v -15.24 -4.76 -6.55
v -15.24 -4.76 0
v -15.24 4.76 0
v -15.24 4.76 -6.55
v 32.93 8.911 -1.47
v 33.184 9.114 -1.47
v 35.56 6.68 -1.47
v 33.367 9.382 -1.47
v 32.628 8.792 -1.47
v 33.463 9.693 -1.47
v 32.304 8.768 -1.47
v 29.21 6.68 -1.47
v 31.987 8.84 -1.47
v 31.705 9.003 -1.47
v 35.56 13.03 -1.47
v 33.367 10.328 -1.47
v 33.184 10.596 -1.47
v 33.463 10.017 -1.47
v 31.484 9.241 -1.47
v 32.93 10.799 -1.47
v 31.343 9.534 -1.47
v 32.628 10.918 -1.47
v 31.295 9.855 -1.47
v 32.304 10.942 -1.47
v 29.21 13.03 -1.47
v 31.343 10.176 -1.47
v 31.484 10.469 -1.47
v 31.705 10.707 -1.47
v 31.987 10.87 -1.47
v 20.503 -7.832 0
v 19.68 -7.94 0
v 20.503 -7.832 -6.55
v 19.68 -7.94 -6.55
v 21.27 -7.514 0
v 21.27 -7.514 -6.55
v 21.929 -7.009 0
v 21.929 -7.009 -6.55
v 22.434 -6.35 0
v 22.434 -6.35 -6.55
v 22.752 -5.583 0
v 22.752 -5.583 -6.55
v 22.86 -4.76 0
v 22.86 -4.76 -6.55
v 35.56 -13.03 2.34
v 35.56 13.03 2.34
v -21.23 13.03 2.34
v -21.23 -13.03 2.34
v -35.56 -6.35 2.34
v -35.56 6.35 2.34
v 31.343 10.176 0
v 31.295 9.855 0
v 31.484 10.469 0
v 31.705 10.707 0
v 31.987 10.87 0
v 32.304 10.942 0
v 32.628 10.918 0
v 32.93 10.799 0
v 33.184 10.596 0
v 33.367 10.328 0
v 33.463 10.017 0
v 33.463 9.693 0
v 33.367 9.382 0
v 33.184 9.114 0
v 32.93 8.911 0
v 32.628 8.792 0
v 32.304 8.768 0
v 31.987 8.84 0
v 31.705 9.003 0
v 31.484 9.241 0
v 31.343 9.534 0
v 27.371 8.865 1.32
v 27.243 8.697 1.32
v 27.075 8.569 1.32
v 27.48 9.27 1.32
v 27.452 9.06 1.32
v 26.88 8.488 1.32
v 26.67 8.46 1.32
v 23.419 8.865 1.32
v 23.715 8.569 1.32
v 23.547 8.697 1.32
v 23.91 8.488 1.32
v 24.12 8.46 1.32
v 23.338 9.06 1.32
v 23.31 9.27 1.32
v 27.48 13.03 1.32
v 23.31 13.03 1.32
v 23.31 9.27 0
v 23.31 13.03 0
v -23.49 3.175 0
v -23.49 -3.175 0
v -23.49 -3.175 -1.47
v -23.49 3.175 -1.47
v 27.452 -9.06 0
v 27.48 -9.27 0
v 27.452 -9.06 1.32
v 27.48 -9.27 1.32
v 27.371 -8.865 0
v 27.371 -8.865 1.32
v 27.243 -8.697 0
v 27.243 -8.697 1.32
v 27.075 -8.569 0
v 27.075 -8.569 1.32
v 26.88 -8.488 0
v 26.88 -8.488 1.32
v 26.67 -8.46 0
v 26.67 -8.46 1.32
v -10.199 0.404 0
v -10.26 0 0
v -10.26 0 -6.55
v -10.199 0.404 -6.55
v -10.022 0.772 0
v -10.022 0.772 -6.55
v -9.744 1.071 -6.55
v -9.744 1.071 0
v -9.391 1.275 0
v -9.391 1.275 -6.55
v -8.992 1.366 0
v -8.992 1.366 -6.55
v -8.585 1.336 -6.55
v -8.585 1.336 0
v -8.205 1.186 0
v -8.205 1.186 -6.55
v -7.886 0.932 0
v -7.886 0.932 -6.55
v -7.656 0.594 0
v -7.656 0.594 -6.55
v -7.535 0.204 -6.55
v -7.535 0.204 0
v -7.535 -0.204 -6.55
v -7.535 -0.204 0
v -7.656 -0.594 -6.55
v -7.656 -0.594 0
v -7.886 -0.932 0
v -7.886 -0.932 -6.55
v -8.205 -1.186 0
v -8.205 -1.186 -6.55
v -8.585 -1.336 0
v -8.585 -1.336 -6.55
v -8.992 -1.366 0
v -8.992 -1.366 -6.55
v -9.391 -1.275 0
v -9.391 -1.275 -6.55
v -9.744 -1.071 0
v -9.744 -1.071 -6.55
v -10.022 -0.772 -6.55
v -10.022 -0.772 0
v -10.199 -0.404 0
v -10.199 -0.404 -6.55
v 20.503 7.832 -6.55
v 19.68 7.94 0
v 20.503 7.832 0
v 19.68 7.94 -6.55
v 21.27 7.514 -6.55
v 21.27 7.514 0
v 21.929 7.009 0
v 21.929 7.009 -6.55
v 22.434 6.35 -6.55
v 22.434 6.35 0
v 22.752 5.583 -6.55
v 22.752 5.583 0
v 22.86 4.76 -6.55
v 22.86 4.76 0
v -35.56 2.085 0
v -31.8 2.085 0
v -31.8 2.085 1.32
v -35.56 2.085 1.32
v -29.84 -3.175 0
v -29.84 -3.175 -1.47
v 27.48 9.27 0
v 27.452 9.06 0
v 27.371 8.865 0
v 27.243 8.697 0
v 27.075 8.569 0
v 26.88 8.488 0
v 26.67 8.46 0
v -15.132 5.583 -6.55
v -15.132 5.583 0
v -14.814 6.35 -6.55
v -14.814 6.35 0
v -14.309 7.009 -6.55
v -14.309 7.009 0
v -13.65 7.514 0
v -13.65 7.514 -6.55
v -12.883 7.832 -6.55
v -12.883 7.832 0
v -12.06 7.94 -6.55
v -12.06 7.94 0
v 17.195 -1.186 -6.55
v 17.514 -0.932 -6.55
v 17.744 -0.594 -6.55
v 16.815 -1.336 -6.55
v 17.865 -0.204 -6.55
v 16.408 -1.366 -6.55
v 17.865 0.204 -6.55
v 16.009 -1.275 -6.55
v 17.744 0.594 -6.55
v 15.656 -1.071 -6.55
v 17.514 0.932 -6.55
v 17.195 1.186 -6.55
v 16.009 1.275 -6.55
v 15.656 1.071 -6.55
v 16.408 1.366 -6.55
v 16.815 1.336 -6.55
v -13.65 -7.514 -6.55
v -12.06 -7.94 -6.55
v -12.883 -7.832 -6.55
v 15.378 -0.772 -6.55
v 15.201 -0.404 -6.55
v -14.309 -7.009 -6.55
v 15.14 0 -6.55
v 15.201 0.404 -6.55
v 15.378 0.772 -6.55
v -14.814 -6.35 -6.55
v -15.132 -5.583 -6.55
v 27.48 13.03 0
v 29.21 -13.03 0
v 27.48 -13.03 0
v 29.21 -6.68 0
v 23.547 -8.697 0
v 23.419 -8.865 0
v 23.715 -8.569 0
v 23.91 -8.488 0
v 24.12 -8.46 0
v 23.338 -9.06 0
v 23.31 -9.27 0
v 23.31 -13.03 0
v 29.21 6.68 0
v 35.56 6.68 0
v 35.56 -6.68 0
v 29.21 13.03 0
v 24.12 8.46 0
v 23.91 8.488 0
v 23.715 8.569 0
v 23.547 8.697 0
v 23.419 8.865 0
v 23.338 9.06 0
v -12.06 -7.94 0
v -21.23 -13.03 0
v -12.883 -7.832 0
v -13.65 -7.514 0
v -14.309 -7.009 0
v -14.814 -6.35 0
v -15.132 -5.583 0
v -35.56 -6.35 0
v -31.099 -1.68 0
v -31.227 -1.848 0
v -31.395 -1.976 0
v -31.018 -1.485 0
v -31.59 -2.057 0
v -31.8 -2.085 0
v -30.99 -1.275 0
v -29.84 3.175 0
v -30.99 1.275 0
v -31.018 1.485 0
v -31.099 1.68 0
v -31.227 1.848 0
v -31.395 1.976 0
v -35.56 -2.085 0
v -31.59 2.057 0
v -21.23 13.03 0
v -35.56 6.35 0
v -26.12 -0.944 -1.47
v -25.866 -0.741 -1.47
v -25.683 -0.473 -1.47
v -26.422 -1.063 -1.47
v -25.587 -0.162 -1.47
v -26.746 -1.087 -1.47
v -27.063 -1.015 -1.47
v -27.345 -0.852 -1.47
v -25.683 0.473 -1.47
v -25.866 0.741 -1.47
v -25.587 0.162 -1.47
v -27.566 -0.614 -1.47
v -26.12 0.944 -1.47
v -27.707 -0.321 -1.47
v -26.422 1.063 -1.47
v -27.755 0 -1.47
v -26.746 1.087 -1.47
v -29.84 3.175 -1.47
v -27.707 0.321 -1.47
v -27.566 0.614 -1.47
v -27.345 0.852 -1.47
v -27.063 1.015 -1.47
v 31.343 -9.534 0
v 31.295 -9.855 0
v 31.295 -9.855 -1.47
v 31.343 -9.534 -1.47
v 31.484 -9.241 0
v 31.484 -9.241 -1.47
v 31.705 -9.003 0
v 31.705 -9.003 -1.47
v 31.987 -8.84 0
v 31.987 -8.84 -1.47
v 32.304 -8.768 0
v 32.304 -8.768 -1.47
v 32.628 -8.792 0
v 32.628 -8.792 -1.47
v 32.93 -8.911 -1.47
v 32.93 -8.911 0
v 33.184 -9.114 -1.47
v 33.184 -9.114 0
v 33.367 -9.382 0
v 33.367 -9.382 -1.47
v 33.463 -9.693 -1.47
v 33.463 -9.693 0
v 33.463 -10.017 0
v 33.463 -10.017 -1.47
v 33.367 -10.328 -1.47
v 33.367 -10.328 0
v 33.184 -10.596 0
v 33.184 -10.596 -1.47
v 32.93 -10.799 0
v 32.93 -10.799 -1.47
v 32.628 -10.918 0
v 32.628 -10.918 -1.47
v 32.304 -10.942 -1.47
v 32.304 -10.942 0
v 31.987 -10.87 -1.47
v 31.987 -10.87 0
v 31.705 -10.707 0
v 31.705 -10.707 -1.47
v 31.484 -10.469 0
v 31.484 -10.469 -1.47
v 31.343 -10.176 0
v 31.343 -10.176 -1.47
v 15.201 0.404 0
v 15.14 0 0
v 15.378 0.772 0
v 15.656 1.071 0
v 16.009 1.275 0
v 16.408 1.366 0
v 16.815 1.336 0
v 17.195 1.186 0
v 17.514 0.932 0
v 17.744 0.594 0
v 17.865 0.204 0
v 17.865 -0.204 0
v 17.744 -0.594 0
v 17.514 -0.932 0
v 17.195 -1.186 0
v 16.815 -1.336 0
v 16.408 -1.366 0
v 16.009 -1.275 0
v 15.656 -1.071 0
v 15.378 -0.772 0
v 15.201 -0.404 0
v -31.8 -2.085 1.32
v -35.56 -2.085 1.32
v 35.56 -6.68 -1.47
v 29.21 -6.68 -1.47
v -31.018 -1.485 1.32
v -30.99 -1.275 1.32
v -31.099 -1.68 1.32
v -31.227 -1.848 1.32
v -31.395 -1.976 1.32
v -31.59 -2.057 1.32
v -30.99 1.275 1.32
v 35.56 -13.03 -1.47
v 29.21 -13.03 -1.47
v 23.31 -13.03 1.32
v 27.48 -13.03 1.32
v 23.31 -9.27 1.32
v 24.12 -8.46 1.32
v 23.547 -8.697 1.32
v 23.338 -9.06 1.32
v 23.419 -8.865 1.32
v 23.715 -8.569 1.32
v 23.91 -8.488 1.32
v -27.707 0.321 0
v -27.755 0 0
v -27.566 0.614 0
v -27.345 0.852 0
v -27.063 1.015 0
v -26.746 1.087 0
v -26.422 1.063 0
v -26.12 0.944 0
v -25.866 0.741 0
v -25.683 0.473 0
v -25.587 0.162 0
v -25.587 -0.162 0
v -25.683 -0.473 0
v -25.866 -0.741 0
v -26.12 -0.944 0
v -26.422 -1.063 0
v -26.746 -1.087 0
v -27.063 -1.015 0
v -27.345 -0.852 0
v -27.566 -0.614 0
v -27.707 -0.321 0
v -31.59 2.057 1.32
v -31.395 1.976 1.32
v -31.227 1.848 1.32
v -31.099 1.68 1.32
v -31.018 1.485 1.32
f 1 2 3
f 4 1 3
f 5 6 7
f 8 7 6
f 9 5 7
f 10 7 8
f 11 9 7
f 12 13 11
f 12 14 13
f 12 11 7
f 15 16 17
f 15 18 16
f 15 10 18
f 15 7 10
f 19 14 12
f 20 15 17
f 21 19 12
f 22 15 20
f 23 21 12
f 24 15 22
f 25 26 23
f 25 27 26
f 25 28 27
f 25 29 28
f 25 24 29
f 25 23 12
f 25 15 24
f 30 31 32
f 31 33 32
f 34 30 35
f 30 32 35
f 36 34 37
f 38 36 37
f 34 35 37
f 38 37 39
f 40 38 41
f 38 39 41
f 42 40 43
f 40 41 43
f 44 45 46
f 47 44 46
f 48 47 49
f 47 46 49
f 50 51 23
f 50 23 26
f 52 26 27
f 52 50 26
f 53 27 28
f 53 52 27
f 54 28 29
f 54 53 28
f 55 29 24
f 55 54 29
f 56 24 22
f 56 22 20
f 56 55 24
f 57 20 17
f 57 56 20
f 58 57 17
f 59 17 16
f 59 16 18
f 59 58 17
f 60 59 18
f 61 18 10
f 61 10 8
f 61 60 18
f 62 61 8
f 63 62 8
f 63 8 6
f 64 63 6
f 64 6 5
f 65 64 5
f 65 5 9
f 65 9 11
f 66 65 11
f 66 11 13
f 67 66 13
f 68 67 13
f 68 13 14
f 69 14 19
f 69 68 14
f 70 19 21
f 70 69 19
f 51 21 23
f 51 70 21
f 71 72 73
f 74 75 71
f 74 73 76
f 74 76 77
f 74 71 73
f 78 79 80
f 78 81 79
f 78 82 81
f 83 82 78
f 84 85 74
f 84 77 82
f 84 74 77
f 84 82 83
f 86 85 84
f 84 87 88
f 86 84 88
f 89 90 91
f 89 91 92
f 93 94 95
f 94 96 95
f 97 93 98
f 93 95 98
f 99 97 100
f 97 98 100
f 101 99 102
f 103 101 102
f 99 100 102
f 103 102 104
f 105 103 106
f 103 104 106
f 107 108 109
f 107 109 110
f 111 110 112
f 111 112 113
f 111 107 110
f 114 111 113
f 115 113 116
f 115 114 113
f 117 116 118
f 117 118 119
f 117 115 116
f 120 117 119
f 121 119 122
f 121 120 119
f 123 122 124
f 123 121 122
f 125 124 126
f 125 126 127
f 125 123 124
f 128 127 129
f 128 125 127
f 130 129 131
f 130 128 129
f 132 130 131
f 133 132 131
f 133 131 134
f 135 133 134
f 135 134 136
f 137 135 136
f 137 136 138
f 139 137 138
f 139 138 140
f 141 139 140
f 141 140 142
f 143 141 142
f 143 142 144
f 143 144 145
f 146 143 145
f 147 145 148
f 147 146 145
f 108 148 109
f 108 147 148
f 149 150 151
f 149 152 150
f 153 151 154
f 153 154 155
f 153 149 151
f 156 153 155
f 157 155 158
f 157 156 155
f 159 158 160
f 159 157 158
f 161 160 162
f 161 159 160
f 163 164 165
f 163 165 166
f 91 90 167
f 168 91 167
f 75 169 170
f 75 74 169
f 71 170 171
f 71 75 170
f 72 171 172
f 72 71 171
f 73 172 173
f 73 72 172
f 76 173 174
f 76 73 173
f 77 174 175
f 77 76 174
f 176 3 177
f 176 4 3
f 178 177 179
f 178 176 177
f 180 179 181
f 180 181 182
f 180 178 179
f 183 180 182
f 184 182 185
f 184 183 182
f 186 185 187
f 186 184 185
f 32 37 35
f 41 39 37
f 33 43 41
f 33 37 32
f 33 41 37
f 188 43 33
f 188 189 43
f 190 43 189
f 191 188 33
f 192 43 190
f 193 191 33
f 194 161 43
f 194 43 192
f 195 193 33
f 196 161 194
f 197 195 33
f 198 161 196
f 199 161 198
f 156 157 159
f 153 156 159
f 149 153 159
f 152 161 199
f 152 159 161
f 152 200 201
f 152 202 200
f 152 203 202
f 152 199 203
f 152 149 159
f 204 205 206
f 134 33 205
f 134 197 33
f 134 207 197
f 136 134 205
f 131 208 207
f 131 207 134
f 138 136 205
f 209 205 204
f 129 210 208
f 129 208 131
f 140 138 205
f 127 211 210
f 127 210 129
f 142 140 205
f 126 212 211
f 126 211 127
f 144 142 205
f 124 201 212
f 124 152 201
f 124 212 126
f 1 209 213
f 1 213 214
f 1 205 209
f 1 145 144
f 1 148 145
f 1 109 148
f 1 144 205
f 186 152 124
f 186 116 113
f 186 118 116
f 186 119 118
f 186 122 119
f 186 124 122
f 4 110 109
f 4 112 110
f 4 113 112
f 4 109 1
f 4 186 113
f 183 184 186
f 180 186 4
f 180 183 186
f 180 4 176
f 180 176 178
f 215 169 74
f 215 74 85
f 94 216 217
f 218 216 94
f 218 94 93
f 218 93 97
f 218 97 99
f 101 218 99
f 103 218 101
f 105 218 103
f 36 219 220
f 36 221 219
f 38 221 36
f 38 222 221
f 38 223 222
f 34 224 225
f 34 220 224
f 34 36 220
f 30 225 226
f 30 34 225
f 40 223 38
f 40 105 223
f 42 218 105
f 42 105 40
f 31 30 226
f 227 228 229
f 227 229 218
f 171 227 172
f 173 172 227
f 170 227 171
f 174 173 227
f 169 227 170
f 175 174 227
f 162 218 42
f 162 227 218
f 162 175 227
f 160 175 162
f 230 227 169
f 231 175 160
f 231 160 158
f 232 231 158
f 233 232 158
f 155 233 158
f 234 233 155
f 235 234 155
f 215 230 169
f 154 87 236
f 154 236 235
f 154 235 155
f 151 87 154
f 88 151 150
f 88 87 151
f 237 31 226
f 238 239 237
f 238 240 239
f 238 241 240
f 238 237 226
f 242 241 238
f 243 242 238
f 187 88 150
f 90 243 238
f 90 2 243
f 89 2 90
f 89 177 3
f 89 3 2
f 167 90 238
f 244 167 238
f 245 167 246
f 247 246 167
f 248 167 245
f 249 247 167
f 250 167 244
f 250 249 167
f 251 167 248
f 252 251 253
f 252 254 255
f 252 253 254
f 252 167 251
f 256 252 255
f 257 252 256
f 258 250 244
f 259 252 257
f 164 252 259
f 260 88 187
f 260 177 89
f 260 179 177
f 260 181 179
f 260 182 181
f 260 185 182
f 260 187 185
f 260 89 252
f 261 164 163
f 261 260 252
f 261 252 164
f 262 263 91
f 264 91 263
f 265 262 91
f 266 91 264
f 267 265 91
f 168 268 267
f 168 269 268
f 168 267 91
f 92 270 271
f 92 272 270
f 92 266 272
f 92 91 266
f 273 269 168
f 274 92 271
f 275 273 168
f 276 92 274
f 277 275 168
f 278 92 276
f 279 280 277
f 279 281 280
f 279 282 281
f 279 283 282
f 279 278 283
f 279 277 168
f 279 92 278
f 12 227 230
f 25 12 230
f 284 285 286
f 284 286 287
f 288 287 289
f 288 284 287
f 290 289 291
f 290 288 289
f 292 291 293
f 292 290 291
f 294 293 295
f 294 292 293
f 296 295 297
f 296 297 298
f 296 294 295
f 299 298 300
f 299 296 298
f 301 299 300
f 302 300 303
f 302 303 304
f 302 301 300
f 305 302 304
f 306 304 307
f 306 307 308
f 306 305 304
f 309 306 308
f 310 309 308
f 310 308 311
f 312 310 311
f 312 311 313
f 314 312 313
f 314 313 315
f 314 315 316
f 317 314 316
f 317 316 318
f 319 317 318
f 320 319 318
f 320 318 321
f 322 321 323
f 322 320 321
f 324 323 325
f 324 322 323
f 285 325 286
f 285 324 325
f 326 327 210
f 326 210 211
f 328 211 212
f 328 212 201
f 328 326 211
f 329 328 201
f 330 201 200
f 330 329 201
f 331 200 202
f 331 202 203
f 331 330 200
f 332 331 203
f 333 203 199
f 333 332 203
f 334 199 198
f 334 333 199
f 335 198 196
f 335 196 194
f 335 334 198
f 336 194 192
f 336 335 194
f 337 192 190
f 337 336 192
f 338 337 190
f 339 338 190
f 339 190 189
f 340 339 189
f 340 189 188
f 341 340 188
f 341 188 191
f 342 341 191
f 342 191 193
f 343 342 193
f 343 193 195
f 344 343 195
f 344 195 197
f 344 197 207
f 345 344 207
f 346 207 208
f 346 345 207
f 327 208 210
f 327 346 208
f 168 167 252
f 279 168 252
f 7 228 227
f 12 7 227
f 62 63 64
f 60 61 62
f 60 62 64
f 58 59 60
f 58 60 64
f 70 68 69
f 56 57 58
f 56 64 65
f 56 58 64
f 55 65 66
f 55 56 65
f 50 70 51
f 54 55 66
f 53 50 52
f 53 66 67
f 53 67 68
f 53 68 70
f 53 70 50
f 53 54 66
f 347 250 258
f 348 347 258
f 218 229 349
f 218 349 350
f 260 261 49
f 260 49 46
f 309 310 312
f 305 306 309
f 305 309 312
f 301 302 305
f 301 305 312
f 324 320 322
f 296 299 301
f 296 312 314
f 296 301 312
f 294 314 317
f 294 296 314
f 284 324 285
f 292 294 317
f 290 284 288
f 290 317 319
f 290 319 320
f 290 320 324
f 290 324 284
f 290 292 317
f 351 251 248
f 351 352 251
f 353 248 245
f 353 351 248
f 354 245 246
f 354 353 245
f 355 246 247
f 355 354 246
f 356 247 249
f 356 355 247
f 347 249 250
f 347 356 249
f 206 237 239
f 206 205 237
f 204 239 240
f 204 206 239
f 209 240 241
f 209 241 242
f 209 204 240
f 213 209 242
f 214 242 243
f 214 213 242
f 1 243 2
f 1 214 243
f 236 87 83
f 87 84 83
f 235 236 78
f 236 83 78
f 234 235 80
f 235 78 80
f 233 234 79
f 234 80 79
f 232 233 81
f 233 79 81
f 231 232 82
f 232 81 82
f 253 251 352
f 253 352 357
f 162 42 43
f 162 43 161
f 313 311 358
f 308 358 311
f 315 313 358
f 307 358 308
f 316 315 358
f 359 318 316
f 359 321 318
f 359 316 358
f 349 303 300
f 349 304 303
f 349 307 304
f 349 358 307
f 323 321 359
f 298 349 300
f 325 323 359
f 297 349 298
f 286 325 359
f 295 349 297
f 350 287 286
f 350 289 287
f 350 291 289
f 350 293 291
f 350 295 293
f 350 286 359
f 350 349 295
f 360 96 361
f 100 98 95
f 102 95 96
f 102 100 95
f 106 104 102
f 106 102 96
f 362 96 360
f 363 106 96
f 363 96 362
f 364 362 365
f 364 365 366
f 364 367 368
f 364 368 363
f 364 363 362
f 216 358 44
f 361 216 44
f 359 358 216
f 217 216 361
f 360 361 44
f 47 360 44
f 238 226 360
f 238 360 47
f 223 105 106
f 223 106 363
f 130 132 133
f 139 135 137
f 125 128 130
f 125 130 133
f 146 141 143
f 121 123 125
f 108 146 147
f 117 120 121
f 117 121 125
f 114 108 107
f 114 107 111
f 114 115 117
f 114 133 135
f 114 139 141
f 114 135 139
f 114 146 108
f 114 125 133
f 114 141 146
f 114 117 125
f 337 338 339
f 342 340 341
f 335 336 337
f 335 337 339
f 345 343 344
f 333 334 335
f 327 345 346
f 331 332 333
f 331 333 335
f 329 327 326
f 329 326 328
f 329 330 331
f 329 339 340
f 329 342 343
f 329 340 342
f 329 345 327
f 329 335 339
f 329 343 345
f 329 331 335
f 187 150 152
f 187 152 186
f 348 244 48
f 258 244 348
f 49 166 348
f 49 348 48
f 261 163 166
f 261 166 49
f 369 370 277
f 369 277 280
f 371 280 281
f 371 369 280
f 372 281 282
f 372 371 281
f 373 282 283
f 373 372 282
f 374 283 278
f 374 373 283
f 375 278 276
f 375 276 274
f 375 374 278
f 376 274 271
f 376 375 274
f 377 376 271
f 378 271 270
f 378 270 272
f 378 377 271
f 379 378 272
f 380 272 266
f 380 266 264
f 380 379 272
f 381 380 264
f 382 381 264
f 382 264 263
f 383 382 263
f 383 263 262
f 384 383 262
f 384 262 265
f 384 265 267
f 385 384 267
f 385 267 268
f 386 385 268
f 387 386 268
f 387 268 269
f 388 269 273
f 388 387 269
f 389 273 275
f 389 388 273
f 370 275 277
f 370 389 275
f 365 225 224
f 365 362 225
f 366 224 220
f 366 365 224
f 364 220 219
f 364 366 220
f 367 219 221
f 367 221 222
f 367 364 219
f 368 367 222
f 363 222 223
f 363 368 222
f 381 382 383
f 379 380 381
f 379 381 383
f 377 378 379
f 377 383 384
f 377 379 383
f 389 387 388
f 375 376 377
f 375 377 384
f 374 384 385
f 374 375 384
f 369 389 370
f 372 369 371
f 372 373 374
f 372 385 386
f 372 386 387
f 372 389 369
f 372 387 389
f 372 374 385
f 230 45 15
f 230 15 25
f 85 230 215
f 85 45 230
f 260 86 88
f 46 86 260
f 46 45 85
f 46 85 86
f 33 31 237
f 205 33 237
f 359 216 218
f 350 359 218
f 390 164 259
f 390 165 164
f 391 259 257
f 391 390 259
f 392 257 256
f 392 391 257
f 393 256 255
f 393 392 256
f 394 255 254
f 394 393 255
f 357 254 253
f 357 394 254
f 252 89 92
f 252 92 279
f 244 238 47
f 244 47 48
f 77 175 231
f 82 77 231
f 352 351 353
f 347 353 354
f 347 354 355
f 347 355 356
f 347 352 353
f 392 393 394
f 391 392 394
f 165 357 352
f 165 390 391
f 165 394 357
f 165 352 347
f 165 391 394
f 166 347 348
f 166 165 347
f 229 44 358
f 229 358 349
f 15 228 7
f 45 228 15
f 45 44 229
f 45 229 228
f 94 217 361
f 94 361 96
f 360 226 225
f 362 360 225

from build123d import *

# Parameters (mm, degrees)
EXTRUDE1_DEPTH     = 2.34
SKETCH2_W          = 6.35
SKETCH2_H          = 6.35
SKETCH2_R          = 1.09
EXTRUDE2_DEPTH     = 1.47
SKETCH3_W          = 4.17
SKETCH3_H          = 4.57
SKETCH3_W_2        = 4.57
SKETCH3_H_2        = 4.17
CUT_EXTRUDE1_DEPTH = 1.32
FILLET1_R          = 0.81
SKETCH4_W          = 38.1
SKETCH4_H          = 15.88
SKETCH4_R          = 1.37
EXTRUDE3_DEPTH     = 6.55
FILLET2_R          = 3.18


with BuildPart() as part:
    # Sketch1 → Extrude1 (new body)
    with BuildSketch(Plane.XY):
        Polygon((-35.56, -6.35), (-35.56, 6.35), (-21.23, 13.03), (35.56, 13.03), (35.56, -13.03), (-21.23, -13.03), align=None)
    extrude(amount=EXTRUDE1_DEPTH)

    # Sketch2 → Extrude2 (add)
    with BuildSketch(Plane(origin=(0, 0, 0), x_dir=(-1, 0, 0), z_dir=(0, 0, -1))):
        with Locations((-32.385, 9.855)):
            Rectangle(SKETCH2_W, SKETCH2_H)
        with Locations((-32.385, 9.855)):
            Circle(SKETCH2_R, mode=Mode.SUBTRACT)
        with Locations((-32.385, -9.855)):
            Rectangle(SKETCH2_W, SKETCH2_H)
        with Locations((-32.385, -9.855)):
            Circle(SKETCH2_R, mode=Mode.SUBTRACT)
        with Locations((26.665, 0)):
            Rectangle(SKETCH2_W, SKETCH2_H)
        with Locations((26.665, 0)):
            Circle(SKETCH2_R, mode=Mode.SUBTRACT)
    extrude(amount=EXTRUDE2_DEPTH)

    # Sketch3 → Cut-Extrude1 (cut)
    with BuildSketch(Plane(origin=(0, 0, 0), x_dir=(-1, 0, 0), z_dir=(0, 0, -1))):
        with Locations((-25.395, -10.745)):
            Rectangle(SKETCH3_W, SKETCH3_H)
        with Locations((-25.395, 10.745)):
            Rectangle(SKETCH3_W, SKETCH3_H)
        with Locations((33.275, 0)):
            Rectangle(SKETCH3_W_2, SKETCH3_H_2)
    extrude(amount=-CUT_EXTRUDE1_DEPTH, mode=Mode.SUBTRACT)

    # Fillet1
    fillet1_edges = [part.edges().sort_by_distance(p)[0] for p in [
        (27.48, -8.46, 0.66),
        (23.31, -8.46, 0.66),
        (27.48, 8.46, 0.66),
        (23.31, 8.46, 0.66),
        (-30.99, -2.085, 0.66),
        (-30.99, 2.085, 0.66),
    ]]
    fillet(fillet1_edges, radius=FILLET1_R)

    # Sketch4 → Extrude3 (add)
    with BuildSketch(Plane(origin=(0, 0, 0), x_dir=(-1, 0, 0), z_dir=(0, 0, -1))):
        with Locations((-3.81, 0)):
            Rectangle(SKETCH4_W, SKETCH4_H)
        with Locations((-16.51, 0)):
            Circle(SKETCH4_R, mode=Mode.SUBTRACT)
        with Locations((8.89, 0)):
            Circle(SKETCH4_R, mode=Mode.SUBTRACT)
    extrude(amount=EXTRUDE3_DEPTH)

    # Fillet2
    fillet2_edges = [part.edges().sort_by_distance(p)[0] for p in [
        (22.86, 7.94, -3.275),
        (22.86, -7.94, -3.275),
        (-15.24, -7.94, -3.275),
        (-15.24, 7.94, -3.275),
    ]]
    fillet(fillet2_edges, radius=FILLET2_R)


solid = part.part
